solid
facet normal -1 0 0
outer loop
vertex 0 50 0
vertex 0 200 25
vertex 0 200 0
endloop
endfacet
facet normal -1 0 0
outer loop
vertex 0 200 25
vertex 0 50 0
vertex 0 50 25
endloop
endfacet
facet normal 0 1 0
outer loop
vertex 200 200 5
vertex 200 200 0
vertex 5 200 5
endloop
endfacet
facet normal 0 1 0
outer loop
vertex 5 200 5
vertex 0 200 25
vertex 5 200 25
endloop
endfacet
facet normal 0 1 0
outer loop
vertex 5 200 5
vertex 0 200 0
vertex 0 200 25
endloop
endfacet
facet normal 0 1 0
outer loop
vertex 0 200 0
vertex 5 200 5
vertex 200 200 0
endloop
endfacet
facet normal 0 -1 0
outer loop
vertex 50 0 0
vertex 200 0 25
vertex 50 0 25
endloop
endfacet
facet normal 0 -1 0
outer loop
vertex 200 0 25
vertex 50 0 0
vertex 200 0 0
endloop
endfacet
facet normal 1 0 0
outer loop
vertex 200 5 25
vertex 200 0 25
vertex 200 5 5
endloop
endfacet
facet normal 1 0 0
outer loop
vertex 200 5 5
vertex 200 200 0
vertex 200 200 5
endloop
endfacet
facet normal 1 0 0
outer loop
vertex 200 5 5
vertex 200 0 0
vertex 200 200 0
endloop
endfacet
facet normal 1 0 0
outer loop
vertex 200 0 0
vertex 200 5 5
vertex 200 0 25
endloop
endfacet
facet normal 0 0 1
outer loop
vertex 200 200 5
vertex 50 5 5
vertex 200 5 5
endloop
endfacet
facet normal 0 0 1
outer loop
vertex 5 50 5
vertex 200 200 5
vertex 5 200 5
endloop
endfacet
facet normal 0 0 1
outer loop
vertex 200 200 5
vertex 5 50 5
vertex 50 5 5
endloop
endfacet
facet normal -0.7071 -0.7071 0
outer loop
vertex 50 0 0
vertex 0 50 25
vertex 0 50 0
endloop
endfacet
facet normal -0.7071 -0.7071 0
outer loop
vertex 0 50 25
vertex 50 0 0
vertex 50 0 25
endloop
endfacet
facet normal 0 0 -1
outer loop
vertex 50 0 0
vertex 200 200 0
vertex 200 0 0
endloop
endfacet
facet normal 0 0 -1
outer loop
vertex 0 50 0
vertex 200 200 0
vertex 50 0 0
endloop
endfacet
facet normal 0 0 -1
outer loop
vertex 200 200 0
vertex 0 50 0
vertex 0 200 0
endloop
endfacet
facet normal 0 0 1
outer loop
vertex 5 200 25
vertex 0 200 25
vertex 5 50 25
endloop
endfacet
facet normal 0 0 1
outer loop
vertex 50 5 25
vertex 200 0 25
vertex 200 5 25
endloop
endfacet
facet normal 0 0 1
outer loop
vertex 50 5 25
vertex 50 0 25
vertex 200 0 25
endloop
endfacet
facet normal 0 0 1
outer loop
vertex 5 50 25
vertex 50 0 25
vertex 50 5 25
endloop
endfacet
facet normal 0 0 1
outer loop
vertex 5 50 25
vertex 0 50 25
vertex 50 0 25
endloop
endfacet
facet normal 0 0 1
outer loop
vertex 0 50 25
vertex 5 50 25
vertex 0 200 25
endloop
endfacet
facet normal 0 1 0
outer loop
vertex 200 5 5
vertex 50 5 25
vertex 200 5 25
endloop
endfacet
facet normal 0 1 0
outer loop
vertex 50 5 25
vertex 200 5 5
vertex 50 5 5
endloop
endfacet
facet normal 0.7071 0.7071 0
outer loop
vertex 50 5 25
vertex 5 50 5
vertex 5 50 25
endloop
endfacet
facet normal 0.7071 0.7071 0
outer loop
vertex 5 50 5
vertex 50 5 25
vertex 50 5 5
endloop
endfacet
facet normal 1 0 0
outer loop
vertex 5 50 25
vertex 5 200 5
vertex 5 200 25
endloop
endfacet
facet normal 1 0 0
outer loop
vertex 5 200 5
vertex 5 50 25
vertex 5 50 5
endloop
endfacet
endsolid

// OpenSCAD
moduleSize = 200; // [50:350]
rows = 1; // [1:20]
columns = 1; // [1:20]
wallHeight = 20; // [5:300]

module base(index) {
    translate([index * moduleSize, 0, 0])
        cube([moduleSize, moduleSize, 5], center=false);
}

module baseCorner(rotation) {
    if (rotation == 0) {
        linear_extrude(height=5)
            polygon(points=[[0,50], [50,0], [moduleSize ,0], [moduleSize,moduleSize], [50,moduleSize], [0,moduleSize]]);
    } else if (rotation == 90) {
        translate([moduleSize * rows, 0, 0])
            rotate([0, 0, rotation])
                linear_extrude(height=5)
                    polygon(points=[[0,50], [50,0], [moduleSize ,0], [moduleSize,moduleSize], [50,moduleSize], [0,moduleSize]]);
    } else if (rotation == 180) {
        translate([moduleSize * rows, moduleSize, 0])
            rotate([0, 0, rotation])
                linear_extrude(height=5)
                    polygon(points=[[0,50], [50,0], [moduleSize ,0], [moduleSize,moduleSize], [50,moduleSize], [0,moduleSize]]);
    } else {
        translate([0, moduleSize, 0])
            rotate([0, 0, rotation])
                linear_extrude(height=5)
                    polygon(points=[[0,50], [50,0], [moduleSize ,0], [moduleSize,moduleSize], [50,moduleSize], [0,moduleSize]]);
    }
}

module wall() {
    cube([5, moduleSize, wallHeight], center=false);
}

module wallCorner(rotation) {
    if (rotation == 0) {
        linear_extrude(height=wallHeight)
            polygon(points=[[0,50], [50,0], [moduleSize ,0], [moduleSize,5], [50, 5], [5, 50], [5,moduleSize], [0,moduleSize], [0,50]]);
    } else if (rotation == 90) {
        translate([moduleSize * rows, 0, 0])
            rotate([0, 0, rotation])
                linear_extrude(height=wallHeight)
                    polygon(points=[[0,50], [50,0], [moduleSize ,0], [moduleSize,5], [50, 5], [5, 50], [5,moduleSize], [0,moduleSize], [0,50]]);
    } else if (rotation == 180) {
        translate([moduleSize * rows, moduleSize, 0])
            rotate([0, 0, rotation])
                linear_extrude(height=wallHeight)
                    polygon(points=[[0,50], [50,0], [moduleSize ,0], [moduleSize,5], [50, 5], [5, 50], [5,moduleSize], [0,moduleSize], [0,50]]);
    } else {
        translate([0, moduleSize, 0])
            rotate([0, 0, rotation])
                linear_extrude(height=wallHeight)
                    polygon(points=[[0,50], [50,0], [moduleSize ,0], [moduleSize,5], [50, 5], [5, 50], [5,moduleSize], [0,moduleSize], [0,50]]);
    }
}

module baseCalculation() {
        for (c = [0:columns-1])
            if (c == 0) {
                for (r = [0:rows-1])
                    if (r == 0) {
                        baseCorner(0);
                    } else if (r == rows - 1) {
                        baseCorner(90);
                    } else {
                        base(r);
                    }
            } else if (c == columns - 1) {
                translate([0, moduleSize * c, 0])
                for (r = [0:rows-1])
                    if (r == 0) {
                        baseCorner(270);
                    } else if (r == rows - 1) {
                        baseCorner(180);
                    } else {
                        base(r);
                    }
            } else {
                translate([0, moduleSize * c, 0])
                for (r = [0:rows-1])
                        base(r);
            }
}

module wallCalculation() {
    translate([0, 0, 5])
    for (c = [0:columns-1])
        if (c == 0) {
            for (r = [0:rows-1])
                if (r == 0) {
                    wallCorner(0);
                } else if (r == rows - 1) {
                    wallCorner(90);
                } else {
                    wall();
                }
        } else if (c == columns - 1) {
            translate([0, moduleSize * c, 0])
            for (r = [0:rows-1])
                if (r == 0) {
                    wallCorner(270);
                } else if (r == rows - 1) {
                    wallCorner(180);
                } else {
                    wall();
                }
        } else {
            translate([0, moduleSize * c, 0])
            for (r = [0:rows-1])
                    wall();
        }
}

baseCalculation();
wallCalculation();
